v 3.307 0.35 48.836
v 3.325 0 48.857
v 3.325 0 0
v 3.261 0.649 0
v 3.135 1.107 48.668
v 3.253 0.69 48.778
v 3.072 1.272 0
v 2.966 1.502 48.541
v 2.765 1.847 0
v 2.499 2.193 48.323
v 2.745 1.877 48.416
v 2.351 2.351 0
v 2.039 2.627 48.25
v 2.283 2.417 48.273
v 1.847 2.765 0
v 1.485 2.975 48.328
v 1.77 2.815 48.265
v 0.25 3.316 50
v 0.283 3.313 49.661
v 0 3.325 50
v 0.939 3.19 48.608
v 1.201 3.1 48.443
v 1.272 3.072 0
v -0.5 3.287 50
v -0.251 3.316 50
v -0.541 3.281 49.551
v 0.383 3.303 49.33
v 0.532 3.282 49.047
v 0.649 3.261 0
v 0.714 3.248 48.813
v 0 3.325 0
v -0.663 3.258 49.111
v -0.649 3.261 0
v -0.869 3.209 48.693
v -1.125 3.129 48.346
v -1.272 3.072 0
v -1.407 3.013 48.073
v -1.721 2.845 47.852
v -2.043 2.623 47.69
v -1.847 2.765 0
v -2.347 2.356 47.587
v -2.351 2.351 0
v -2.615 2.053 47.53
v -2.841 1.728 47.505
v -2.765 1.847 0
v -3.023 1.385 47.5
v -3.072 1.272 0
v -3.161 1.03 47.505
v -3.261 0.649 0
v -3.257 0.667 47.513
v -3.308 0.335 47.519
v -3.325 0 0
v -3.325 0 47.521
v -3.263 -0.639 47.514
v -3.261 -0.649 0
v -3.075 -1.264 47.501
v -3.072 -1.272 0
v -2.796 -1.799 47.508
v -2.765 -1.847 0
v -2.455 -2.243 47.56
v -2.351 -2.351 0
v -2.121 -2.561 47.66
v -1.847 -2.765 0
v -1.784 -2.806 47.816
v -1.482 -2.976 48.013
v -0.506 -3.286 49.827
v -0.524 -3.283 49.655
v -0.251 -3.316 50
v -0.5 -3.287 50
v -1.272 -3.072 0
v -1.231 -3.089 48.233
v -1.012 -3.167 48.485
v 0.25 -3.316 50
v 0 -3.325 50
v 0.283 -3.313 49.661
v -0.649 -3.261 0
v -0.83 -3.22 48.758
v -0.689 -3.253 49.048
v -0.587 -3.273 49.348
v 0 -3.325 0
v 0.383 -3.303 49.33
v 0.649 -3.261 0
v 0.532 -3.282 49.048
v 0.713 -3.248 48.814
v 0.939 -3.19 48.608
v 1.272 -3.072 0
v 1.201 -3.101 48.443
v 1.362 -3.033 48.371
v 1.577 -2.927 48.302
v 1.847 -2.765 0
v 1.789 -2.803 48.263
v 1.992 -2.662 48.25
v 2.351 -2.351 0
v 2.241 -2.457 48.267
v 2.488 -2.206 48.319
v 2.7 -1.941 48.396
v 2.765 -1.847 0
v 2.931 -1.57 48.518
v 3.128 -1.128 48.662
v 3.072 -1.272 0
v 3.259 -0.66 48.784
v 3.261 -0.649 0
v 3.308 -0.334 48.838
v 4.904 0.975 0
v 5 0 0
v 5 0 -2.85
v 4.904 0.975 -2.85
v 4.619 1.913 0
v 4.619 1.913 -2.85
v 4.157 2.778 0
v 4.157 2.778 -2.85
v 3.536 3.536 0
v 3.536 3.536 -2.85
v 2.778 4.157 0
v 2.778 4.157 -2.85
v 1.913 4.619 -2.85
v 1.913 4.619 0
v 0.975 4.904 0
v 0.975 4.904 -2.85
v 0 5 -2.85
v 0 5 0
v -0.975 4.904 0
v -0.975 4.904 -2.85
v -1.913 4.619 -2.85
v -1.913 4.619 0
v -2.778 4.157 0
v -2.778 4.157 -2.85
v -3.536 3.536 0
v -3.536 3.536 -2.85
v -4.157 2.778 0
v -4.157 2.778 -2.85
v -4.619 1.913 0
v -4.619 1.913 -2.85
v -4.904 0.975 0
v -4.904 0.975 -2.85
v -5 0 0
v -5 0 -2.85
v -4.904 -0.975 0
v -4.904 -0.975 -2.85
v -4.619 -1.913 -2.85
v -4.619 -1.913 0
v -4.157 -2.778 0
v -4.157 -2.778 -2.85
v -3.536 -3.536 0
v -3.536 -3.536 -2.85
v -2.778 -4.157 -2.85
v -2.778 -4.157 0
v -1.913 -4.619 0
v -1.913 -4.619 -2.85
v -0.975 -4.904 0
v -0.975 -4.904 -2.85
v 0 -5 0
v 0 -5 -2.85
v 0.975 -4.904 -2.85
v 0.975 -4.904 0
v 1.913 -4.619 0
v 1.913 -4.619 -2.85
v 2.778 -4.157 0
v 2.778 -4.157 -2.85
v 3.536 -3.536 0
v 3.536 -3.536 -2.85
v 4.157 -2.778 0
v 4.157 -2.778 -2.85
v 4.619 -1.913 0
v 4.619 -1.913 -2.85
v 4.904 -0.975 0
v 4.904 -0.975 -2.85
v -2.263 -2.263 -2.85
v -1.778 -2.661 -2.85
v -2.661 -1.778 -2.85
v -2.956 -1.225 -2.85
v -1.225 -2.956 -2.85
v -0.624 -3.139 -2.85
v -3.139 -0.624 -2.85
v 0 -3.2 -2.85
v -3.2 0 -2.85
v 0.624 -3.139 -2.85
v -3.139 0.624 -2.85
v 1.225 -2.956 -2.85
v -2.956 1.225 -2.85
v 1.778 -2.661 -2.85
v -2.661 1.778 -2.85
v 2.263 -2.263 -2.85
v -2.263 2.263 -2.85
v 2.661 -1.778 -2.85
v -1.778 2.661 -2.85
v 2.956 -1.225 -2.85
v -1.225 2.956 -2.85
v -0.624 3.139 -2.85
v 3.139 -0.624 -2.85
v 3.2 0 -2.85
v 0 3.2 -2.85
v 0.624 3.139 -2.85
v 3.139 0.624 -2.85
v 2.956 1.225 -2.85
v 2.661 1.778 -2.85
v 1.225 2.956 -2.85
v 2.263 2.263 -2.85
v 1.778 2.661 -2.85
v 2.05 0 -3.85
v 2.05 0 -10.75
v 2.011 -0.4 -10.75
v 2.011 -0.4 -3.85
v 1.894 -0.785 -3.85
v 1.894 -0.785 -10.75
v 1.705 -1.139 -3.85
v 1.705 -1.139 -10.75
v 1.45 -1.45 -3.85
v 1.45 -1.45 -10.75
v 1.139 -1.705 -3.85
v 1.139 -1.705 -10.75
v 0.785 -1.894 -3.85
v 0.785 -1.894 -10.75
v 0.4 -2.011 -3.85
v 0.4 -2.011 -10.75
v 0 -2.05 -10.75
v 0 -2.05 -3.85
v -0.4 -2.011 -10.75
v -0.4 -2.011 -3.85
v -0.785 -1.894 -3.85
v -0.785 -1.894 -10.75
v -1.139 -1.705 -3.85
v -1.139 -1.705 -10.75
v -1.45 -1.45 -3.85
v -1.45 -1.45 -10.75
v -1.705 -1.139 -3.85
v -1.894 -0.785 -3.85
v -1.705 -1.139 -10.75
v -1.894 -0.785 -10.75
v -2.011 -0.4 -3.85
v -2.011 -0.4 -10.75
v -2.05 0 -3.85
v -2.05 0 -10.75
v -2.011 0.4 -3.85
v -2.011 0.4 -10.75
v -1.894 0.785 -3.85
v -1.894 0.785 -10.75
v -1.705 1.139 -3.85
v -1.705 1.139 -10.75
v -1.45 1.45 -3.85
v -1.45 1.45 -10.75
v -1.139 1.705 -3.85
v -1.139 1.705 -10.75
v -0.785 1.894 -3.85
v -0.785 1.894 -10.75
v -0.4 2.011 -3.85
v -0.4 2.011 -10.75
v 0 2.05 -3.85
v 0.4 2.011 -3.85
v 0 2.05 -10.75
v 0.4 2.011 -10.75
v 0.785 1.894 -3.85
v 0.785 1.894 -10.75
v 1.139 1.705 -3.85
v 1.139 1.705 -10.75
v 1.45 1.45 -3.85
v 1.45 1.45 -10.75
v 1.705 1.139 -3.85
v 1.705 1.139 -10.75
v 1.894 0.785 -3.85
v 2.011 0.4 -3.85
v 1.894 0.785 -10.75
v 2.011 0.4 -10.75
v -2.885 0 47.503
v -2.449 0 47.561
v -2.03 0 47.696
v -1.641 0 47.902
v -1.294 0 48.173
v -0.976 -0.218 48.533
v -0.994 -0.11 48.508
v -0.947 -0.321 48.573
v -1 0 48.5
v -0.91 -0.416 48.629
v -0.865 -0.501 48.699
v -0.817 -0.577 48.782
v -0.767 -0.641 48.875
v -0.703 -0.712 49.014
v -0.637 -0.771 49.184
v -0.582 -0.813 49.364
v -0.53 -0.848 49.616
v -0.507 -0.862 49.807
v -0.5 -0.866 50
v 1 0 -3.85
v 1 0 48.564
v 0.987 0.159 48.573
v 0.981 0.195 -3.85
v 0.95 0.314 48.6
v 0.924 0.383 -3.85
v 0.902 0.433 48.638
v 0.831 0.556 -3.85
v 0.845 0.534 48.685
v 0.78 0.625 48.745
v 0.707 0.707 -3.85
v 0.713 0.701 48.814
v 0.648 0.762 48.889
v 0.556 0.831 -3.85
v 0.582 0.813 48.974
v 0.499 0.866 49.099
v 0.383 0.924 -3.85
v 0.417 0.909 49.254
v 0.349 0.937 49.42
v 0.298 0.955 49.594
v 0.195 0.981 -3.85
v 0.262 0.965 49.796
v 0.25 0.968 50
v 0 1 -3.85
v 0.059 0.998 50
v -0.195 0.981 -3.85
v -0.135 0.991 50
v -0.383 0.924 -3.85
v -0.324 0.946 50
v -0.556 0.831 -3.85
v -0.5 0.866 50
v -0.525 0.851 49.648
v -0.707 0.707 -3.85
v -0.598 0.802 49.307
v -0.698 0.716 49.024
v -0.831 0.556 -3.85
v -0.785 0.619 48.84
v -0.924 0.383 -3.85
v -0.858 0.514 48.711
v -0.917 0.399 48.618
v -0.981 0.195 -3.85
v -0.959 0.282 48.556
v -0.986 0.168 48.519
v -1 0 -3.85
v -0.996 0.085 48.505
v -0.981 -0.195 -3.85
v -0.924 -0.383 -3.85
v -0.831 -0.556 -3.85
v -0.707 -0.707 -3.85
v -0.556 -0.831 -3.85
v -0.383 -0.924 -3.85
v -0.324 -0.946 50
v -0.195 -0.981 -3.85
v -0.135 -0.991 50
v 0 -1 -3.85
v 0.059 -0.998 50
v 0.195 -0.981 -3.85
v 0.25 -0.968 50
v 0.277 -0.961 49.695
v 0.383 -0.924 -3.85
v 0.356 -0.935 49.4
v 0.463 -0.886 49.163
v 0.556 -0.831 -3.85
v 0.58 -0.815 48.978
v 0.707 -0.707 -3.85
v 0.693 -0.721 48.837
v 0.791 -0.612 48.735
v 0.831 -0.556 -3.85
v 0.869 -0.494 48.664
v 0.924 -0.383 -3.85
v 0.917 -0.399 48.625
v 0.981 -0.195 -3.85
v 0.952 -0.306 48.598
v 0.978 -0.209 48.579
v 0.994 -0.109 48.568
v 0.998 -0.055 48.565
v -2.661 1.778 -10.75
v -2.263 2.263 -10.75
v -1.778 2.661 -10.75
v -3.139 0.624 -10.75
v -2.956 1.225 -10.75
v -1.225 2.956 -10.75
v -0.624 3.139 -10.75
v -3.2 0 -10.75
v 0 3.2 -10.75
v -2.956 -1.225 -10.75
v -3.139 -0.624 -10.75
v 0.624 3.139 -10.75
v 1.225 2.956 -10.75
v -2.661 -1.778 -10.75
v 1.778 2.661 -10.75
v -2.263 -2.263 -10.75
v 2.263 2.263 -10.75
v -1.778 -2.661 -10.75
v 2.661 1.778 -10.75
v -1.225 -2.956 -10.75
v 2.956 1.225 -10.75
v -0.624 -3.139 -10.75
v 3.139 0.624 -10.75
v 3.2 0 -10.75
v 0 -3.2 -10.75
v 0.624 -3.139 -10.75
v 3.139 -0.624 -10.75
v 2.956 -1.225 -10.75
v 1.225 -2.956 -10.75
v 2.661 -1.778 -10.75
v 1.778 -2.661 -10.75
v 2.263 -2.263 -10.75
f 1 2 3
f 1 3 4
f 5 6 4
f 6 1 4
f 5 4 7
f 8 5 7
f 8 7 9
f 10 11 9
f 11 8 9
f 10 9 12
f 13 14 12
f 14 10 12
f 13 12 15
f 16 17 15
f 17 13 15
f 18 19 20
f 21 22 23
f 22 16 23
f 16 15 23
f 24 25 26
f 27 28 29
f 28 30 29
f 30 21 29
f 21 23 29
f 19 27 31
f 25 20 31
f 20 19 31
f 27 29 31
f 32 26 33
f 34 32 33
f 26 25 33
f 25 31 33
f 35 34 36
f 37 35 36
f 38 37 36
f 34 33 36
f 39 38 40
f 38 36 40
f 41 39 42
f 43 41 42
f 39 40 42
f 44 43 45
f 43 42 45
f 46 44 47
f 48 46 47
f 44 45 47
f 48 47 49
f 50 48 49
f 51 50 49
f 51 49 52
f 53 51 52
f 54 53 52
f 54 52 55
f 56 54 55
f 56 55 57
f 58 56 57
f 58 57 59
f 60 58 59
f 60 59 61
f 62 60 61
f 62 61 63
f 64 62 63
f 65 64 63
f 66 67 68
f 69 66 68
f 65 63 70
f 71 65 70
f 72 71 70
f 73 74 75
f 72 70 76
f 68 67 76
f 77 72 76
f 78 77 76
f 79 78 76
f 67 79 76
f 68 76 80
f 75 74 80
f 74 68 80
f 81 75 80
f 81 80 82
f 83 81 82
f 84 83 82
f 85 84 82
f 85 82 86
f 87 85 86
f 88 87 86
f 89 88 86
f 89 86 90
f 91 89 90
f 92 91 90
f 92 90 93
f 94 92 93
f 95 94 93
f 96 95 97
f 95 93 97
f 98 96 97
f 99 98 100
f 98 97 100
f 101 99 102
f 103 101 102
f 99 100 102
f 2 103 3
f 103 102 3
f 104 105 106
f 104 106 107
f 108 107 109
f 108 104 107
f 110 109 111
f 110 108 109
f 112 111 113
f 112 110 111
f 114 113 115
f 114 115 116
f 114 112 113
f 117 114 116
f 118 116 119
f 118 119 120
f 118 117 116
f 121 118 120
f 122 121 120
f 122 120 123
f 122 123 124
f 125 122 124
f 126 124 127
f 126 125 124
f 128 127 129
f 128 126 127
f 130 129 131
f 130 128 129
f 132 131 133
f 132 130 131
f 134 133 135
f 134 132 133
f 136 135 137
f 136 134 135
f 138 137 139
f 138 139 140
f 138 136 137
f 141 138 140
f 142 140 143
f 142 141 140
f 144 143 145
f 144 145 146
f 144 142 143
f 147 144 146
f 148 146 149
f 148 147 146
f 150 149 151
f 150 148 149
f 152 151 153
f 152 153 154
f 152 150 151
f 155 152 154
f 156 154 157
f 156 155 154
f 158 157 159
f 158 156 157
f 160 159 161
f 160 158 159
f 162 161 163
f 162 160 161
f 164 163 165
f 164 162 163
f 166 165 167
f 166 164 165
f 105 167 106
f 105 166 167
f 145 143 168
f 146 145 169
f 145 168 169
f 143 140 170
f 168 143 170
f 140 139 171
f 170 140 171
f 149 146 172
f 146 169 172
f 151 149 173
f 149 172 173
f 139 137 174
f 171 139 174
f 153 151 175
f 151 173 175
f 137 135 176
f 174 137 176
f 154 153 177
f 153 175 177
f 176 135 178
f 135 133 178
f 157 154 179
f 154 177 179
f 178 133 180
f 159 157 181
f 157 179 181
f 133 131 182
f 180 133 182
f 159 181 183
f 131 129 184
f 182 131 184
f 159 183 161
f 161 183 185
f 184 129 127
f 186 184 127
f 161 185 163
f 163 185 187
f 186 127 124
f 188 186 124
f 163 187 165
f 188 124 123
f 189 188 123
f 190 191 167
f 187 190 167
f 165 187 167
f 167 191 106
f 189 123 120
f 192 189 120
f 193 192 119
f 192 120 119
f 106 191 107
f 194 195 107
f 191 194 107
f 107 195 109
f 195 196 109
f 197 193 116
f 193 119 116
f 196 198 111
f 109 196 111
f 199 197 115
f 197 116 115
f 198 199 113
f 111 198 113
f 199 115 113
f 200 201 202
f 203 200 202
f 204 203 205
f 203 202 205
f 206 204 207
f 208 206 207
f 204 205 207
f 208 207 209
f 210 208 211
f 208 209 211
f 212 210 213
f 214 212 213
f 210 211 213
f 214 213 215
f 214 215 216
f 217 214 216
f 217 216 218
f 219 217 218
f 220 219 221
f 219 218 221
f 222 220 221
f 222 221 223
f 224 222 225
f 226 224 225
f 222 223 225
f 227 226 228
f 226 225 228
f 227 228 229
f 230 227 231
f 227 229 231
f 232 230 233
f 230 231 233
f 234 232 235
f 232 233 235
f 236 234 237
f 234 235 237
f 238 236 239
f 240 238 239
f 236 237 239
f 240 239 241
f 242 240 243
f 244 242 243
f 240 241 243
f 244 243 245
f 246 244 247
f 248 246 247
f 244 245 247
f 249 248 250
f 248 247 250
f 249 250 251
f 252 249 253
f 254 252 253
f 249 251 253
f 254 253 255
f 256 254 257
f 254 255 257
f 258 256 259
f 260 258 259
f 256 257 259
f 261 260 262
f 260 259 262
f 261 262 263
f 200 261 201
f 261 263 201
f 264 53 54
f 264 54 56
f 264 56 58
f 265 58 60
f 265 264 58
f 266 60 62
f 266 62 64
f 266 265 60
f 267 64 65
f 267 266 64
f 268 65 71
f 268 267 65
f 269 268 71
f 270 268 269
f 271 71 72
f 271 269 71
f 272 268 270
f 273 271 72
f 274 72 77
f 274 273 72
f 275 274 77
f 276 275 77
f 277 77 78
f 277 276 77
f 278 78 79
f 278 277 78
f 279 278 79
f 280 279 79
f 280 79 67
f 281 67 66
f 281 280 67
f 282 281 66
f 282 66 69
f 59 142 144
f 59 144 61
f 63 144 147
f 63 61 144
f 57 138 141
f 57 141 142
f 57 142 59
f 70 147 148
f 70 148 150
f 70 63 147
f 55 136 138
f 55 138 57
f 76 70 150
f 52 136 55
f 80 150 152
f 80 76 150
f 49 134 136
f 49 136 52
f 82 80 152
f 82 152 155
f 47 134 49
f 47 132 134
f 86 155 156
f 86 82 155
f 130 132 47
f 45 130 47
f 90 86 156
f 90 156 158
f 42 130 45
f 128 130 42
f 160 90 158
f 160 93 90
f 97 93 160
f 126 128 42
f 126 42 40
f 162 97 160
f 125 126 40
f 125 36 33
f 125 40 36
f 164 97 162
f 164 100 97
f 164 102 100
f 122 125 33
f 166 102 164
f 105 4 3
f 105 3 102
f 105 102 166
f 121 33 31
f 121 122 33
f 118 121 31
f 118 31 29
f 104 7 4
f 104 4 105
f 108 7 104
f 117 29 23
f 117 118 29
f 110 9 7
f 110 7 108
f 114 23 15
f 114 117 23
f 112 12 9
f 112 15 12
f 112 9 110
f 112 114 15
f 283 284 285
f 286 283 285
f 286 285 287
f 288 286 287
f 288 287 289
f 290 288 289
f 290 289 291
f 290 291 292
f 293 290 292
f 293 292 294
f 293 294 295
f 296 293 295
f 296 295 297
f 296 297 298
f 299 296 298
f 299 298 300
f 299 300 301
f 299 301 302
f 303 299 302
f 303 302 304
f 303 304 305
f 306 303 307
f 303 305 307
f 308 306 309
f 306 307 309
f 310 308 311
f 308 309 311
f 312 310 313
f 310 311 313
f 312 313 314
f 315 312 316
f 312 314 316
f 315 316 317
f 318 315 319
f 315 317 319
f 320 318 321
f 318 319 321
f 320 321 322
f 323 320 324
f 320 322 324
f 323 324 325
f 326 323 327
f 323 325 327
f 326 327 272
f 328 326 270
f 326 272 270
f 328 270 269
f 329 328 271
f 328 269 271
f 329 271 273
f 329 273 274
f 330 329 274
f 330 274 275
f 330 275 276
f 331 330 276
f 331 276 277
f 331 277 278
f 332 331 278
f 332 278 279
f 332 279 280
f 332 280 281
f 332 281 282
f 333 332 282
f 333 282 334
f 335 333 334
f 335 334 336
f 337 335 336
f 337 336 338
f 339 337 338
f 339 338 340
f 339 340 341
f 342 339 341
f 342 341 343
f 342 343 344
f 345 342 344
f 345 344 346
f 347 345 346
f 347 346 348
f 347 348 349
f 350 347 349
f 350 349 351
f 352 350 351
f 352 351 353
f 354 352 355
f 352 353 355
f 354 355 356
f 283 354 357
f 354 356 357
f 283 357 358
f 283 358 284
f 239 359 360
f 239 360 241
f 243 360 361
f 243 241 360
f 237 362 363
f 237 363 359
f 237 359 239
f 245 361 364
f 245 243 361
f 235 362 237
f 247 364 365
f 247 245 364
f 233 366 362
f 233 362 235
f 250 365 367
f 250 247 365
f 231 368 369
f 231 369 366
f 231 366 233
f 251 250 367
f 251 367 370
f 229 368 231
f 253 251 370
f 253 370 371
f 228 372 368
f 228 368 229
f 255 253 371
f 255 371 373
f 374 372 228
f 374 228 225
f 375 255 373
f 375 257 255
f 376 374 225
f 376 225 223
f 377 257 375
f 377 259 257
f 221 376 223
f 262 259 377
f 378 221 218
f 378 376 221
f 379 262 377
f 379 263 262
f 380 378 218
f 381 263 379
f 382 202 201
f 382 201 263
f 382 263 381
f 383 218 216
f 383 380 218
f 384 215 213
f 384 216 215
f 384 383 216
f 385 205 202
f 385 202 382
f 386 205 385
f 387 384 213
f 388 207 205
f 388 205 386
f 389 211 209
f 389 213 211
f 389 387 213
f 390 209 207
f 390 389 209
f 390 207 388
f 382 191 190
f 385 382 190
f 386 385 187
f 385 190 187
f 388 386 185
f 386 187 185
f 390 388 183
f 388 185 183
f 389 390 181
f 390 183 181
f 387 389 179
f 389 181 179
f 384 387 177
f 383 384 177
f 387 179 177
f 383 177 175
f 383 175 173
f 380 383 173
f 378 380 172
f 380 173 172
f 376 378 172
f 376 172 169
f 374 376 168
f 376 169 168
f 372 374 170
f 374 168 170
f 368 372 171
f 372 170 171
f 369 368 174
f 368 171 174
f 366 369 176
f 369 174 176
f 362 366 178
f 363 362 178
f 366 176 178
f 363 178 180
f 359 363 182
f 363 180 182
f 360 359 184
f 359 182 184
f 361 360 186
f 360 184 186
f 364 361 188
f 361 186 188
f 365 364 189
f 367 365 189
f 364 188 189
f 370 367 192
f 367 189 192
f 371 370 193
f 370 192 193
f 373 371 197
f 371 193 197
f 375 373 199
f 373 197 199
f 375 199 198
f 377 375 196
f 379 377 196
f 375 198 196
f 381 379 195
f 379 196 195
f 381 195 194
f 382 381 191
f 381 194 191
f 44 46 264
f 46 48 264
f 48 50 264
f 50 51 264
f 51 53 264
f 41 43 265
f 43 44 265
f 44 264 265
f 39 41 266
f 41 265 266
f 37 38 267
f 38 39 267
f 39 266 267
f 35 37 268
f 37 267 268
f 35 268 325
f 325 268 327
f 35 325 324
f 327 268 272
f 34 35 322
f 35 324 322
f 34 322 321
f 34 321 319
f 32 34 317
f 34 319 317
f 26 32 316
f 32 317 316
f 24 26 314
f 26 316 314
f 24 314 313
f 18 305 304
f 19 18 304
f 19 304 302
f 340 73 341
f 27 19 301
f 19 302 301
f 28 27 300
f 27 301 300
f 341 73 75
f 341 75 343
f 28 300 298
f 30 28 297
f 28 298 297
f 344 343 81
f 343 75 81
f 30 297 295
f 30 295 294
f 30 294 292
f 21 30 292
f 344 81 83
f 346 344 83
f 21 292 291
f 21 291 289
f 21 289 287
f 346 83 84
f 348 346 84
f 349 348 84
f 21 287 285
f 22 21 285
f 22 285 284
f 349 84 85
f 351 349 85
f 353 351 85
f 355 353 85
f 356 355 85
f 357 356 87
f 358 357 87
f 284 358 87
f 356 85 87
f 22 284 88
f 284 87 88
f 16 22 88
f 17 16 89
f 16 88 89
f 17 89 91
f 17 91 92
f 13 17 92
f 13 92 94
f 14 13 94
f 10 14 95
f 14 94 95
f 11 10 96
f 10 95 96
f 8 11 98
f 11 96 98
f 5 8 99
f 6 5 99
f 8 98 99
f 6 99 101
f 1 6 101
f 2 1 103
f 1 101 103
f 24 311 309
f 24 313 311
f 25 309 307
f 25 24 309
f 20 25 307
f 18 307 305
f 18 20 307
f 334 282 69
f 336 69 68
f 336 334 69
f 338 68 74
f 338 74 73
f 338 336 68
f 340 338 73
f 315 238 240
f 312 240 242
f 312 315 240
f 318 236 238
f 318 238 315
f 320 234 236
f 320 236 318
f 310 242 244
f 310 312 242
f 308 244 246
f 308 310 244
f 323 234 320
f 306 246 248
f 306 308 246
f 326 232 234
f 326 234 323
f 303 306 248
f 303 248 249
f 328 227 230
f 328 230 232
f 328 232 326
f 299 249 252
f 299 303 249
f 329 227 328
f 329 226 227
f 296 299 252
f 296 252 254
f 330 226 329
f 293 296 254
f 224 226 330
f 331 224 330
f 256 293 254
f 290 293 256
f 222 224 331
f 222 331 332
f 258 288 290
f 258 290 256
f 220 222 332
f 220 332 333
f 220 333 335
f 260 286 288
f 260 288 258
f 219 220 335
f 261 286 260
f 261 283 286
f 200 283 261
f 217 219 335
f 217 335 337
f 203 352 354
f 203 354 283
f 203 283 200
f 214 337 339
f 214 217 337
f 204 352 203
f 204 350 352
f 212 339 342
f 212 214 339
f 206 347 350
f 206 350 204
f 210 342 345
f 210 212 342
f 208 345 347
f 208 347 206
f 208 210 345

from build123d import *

# Parameters (mm, degrees)
F0_R      = 3.325
F1_DEPTH  = 50
F2_R      = 5
F2_R_2    = 3.325
F3_DEPTH  = 2.85
F4_R      = 3.2
F5_DEPTH  = 7.9
F6_R      = 1
F7_DEPTH  = 55
F8_R      = 2.05
F9_DEPTH  = 6.9
F10_R     = 2.5
F10_R_2   = 1.75
F11_DEPTH = 4


with BuildPart() as f1:
    # F0 (on Top) → F1 (new body)
    with BuildSketch(Plane.XY):
        Circle(F0_R)
    extrude(amount=F1_DEPTH)

    # F2 (on face) → F3 (join)
    with BuildSketch(Plane.XY):
        Circle(F2_R)
        Circle(F2_R_2, mode=Mode.SUBTRACT)
        Circle(F2_R)
    extrude(amount=-F3_DEPTH)

    # F4 (on face) → F5 (join)
    with BuildSketch(Plane(origin=(0, 0, -2.85), x_dir=(1, 0, 0), z_dir=(0, 0, -1))):
        Circle(F4_R)
    extrude(amount=F5_DEPTH)

    # F6 (on face) → F7 (cut)
    with BuildSketch(Plane.XY.offset(50)):
        Circle(F6_R)
    extrude(amount=-F7_DEPTH, mode=Mode.SUBTRACT)

    # F8 (on face) → F9 (cut)
    with BuildSketch(Plane(origin=(0, 0, -10.75), x_dir=(1, 0, 0), z_dir=(0, 0, -1))):
        Circle(F8_R)
    extrude(amount=-F9_DEPTH, mode=Mode.SUBTRACT)

    # F10 (on Front) → F11 (cut, symmetric)
    with BuildSketch(Plane.XZ):
        with Locations((-3, 50)):
            Circle(F10_R)
        with Locations((2, 50)):
            Circle(F10_R_2)
    extrude(amount=F11_DEPTH, both=True, mode=Mode.SUBTRACT)


solid = f1.part
